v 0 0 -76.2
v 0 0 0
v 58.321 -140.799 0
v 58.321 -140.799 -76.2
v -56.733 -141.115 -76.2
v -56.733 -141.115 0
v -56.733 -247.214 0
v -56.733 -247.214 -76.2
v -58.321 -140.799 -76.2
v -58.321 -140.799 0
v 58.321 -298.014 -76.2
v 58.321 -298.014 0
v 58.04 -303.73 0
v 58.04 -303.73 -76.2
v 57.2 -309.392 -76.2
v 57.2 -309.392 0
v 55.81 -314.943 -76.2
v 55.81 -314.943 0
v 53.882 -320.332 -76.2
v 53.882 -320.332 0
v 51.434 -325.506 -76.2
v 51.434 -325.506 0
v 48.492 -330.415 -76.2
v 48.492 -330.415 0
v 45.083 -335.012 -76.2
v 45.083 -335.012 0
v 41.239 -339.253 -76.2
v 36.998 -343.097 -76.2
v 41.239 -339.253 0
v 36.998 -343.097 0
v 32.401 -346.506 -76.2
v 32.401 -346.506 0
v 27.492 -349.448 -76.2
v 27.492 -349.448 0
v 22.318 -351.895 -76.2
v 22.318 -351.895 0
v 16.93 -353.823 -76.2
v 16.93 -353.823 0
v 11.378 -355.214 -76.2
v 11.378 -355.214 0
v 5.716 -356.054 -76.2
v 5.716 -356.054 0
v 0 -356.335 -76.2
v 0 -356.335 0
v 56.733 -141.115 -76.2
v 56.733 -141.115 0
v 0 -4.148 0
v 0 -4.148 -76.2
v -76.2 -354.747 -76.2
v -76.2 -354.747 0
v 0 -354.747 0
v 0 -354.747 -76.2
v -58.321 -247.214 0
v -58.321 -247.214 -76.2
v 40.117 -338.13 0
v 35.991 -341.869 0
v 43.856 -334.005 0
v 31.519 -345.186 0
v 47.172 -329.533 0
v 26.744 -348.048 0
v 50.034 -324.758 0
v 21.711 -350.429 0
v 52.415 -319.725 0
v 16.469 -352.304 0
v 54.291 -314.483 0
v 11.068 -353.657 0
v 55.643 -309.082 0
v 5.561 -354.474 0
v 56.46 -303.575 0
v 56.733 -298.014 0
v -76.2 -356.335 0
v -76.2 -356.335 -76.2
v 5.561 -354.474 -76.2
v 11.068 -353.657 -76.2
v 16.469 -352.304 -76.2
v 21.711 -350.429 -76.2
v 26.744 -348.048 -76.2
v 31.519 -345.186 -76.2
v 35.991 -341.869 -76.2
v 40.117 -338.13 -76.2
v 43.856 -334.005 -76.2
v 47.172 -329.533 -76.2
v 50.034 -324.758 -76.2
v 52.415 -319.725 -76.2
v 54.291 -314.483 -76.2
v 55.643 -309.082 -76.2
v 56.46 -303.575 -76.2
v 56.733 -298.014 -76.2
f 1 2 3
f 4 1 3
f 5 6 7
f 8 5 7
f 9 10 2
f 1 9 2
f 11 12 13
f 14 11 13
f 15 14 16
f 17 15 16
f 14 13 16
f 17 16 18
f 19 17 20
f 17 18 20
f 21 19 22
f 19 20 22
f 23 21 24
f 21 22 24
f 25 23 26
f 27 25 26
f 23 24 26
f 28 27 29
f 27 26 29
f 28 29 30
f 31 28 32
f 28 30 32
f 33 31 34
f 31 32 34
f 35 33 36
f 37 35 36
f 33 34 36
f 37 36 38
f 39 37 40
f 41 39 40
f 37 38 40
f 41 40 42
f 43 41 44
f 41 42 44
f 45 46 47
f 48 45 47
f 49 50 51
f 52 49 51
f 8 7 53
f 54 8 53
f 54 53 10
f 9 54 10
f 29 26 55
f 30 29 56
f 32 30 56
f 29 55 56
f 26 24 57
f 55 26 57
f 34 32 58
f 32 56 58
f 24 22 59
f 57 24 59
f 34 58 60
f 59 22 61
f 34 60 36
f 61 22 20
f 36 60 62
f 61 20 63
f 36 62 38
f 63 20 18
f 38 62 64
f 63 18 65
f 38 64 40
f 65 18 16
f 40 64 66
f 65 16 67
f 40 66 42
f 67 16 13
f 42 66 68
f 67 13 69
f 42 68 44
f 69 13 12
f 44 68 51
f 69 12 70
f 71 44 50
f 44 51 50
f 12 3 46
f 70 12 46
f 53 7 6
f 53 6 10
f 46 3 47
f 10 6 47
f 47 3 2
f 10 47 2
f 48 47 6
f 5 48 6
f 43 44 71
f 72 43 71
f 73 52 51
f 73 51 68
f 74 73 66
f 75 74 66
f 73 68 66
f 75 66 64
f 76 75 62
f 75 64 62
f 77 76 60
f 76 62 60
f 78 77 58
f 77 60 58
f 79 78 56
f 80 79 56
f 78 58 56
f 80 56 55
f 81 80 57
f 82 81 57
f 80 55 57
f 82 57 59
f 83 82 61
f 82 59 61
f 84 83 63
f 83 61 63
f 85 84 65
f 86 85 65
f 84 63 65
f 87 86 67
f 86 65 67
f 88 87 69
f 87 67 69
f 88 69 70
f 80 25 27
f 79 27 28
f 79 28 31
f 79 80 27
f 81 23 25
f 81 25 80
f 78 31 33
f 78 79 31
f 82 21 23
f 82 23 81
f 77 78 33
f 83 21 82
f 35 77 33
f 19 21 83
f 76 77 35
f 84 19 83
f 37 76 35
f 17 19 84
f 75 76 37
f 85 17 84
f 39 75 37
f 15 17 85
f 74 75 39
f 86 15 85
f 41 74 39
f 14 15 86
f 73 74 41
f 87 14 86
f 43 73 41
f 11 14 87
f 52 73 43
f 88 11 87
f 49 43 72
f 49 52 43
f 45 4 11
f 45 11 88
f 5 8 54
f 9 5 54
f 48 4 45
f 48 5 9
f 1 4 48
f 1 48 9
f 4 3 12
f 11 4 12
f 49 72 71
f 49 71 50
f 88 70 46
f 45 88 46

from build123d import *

# Parameters (mm, degrees)
BOSS_EXTRUDE1_DEPTH = 76.2


with BuildPart() as part:
    # Sketch2 → Boss-Extrude1 (new body)
    with BuildSketch(Plane.XY):
        with BuildLine():
            Line((0, 0), (58.320955092, -140.799240755))
            Line((58.320955092, -140.799240755), (58.320955092, -247.213806647))
            Line((58.320955092, -247.213806647), (58.320955092, -298.013806647))
            ThreePointArc((58.320955092, -298.013806647), (41.239142831, -339.252949479), (0, -356.33476174))
            Line((0, -356.33476174), (-76.2, -356.33476174))
            Line((-76.2, -356.33476174), (-76.2, -354.74726174))
            Line((-76.2, -354.74726174), (0, -354.74726174))
            ThreePointArc((0, -354.74726174), (40.116610816, -338.130417463), (56.733455092, -298.013806647))
            Line((56.733455092, -298.013806647), (56.733455092, -247.213806647))
            Line((56.733455092, -247.213806647), (56.733455092, -141.115014138))
            Line((56.733455092, -141.115014138), (0, -4.148337413))
            Line((0, -4.148337413), (-56.733455092, -141.115014138))
            Line((-56.733455092, -141.115014138), (-56.733455092, -247.213806647))
            Line((-56.733455092, -247.213806647), (-58.320955092, -247.213806647))
            Line((-58.320955092, -247.213806647), (-58.320955092, -140.799240755))
            Line((-58.320955092, -140.799240755), (0, 0))
        make_face()
    extrude(amount=-BOSS_EXTRUDE1_DEPTH)


solid = part.part
